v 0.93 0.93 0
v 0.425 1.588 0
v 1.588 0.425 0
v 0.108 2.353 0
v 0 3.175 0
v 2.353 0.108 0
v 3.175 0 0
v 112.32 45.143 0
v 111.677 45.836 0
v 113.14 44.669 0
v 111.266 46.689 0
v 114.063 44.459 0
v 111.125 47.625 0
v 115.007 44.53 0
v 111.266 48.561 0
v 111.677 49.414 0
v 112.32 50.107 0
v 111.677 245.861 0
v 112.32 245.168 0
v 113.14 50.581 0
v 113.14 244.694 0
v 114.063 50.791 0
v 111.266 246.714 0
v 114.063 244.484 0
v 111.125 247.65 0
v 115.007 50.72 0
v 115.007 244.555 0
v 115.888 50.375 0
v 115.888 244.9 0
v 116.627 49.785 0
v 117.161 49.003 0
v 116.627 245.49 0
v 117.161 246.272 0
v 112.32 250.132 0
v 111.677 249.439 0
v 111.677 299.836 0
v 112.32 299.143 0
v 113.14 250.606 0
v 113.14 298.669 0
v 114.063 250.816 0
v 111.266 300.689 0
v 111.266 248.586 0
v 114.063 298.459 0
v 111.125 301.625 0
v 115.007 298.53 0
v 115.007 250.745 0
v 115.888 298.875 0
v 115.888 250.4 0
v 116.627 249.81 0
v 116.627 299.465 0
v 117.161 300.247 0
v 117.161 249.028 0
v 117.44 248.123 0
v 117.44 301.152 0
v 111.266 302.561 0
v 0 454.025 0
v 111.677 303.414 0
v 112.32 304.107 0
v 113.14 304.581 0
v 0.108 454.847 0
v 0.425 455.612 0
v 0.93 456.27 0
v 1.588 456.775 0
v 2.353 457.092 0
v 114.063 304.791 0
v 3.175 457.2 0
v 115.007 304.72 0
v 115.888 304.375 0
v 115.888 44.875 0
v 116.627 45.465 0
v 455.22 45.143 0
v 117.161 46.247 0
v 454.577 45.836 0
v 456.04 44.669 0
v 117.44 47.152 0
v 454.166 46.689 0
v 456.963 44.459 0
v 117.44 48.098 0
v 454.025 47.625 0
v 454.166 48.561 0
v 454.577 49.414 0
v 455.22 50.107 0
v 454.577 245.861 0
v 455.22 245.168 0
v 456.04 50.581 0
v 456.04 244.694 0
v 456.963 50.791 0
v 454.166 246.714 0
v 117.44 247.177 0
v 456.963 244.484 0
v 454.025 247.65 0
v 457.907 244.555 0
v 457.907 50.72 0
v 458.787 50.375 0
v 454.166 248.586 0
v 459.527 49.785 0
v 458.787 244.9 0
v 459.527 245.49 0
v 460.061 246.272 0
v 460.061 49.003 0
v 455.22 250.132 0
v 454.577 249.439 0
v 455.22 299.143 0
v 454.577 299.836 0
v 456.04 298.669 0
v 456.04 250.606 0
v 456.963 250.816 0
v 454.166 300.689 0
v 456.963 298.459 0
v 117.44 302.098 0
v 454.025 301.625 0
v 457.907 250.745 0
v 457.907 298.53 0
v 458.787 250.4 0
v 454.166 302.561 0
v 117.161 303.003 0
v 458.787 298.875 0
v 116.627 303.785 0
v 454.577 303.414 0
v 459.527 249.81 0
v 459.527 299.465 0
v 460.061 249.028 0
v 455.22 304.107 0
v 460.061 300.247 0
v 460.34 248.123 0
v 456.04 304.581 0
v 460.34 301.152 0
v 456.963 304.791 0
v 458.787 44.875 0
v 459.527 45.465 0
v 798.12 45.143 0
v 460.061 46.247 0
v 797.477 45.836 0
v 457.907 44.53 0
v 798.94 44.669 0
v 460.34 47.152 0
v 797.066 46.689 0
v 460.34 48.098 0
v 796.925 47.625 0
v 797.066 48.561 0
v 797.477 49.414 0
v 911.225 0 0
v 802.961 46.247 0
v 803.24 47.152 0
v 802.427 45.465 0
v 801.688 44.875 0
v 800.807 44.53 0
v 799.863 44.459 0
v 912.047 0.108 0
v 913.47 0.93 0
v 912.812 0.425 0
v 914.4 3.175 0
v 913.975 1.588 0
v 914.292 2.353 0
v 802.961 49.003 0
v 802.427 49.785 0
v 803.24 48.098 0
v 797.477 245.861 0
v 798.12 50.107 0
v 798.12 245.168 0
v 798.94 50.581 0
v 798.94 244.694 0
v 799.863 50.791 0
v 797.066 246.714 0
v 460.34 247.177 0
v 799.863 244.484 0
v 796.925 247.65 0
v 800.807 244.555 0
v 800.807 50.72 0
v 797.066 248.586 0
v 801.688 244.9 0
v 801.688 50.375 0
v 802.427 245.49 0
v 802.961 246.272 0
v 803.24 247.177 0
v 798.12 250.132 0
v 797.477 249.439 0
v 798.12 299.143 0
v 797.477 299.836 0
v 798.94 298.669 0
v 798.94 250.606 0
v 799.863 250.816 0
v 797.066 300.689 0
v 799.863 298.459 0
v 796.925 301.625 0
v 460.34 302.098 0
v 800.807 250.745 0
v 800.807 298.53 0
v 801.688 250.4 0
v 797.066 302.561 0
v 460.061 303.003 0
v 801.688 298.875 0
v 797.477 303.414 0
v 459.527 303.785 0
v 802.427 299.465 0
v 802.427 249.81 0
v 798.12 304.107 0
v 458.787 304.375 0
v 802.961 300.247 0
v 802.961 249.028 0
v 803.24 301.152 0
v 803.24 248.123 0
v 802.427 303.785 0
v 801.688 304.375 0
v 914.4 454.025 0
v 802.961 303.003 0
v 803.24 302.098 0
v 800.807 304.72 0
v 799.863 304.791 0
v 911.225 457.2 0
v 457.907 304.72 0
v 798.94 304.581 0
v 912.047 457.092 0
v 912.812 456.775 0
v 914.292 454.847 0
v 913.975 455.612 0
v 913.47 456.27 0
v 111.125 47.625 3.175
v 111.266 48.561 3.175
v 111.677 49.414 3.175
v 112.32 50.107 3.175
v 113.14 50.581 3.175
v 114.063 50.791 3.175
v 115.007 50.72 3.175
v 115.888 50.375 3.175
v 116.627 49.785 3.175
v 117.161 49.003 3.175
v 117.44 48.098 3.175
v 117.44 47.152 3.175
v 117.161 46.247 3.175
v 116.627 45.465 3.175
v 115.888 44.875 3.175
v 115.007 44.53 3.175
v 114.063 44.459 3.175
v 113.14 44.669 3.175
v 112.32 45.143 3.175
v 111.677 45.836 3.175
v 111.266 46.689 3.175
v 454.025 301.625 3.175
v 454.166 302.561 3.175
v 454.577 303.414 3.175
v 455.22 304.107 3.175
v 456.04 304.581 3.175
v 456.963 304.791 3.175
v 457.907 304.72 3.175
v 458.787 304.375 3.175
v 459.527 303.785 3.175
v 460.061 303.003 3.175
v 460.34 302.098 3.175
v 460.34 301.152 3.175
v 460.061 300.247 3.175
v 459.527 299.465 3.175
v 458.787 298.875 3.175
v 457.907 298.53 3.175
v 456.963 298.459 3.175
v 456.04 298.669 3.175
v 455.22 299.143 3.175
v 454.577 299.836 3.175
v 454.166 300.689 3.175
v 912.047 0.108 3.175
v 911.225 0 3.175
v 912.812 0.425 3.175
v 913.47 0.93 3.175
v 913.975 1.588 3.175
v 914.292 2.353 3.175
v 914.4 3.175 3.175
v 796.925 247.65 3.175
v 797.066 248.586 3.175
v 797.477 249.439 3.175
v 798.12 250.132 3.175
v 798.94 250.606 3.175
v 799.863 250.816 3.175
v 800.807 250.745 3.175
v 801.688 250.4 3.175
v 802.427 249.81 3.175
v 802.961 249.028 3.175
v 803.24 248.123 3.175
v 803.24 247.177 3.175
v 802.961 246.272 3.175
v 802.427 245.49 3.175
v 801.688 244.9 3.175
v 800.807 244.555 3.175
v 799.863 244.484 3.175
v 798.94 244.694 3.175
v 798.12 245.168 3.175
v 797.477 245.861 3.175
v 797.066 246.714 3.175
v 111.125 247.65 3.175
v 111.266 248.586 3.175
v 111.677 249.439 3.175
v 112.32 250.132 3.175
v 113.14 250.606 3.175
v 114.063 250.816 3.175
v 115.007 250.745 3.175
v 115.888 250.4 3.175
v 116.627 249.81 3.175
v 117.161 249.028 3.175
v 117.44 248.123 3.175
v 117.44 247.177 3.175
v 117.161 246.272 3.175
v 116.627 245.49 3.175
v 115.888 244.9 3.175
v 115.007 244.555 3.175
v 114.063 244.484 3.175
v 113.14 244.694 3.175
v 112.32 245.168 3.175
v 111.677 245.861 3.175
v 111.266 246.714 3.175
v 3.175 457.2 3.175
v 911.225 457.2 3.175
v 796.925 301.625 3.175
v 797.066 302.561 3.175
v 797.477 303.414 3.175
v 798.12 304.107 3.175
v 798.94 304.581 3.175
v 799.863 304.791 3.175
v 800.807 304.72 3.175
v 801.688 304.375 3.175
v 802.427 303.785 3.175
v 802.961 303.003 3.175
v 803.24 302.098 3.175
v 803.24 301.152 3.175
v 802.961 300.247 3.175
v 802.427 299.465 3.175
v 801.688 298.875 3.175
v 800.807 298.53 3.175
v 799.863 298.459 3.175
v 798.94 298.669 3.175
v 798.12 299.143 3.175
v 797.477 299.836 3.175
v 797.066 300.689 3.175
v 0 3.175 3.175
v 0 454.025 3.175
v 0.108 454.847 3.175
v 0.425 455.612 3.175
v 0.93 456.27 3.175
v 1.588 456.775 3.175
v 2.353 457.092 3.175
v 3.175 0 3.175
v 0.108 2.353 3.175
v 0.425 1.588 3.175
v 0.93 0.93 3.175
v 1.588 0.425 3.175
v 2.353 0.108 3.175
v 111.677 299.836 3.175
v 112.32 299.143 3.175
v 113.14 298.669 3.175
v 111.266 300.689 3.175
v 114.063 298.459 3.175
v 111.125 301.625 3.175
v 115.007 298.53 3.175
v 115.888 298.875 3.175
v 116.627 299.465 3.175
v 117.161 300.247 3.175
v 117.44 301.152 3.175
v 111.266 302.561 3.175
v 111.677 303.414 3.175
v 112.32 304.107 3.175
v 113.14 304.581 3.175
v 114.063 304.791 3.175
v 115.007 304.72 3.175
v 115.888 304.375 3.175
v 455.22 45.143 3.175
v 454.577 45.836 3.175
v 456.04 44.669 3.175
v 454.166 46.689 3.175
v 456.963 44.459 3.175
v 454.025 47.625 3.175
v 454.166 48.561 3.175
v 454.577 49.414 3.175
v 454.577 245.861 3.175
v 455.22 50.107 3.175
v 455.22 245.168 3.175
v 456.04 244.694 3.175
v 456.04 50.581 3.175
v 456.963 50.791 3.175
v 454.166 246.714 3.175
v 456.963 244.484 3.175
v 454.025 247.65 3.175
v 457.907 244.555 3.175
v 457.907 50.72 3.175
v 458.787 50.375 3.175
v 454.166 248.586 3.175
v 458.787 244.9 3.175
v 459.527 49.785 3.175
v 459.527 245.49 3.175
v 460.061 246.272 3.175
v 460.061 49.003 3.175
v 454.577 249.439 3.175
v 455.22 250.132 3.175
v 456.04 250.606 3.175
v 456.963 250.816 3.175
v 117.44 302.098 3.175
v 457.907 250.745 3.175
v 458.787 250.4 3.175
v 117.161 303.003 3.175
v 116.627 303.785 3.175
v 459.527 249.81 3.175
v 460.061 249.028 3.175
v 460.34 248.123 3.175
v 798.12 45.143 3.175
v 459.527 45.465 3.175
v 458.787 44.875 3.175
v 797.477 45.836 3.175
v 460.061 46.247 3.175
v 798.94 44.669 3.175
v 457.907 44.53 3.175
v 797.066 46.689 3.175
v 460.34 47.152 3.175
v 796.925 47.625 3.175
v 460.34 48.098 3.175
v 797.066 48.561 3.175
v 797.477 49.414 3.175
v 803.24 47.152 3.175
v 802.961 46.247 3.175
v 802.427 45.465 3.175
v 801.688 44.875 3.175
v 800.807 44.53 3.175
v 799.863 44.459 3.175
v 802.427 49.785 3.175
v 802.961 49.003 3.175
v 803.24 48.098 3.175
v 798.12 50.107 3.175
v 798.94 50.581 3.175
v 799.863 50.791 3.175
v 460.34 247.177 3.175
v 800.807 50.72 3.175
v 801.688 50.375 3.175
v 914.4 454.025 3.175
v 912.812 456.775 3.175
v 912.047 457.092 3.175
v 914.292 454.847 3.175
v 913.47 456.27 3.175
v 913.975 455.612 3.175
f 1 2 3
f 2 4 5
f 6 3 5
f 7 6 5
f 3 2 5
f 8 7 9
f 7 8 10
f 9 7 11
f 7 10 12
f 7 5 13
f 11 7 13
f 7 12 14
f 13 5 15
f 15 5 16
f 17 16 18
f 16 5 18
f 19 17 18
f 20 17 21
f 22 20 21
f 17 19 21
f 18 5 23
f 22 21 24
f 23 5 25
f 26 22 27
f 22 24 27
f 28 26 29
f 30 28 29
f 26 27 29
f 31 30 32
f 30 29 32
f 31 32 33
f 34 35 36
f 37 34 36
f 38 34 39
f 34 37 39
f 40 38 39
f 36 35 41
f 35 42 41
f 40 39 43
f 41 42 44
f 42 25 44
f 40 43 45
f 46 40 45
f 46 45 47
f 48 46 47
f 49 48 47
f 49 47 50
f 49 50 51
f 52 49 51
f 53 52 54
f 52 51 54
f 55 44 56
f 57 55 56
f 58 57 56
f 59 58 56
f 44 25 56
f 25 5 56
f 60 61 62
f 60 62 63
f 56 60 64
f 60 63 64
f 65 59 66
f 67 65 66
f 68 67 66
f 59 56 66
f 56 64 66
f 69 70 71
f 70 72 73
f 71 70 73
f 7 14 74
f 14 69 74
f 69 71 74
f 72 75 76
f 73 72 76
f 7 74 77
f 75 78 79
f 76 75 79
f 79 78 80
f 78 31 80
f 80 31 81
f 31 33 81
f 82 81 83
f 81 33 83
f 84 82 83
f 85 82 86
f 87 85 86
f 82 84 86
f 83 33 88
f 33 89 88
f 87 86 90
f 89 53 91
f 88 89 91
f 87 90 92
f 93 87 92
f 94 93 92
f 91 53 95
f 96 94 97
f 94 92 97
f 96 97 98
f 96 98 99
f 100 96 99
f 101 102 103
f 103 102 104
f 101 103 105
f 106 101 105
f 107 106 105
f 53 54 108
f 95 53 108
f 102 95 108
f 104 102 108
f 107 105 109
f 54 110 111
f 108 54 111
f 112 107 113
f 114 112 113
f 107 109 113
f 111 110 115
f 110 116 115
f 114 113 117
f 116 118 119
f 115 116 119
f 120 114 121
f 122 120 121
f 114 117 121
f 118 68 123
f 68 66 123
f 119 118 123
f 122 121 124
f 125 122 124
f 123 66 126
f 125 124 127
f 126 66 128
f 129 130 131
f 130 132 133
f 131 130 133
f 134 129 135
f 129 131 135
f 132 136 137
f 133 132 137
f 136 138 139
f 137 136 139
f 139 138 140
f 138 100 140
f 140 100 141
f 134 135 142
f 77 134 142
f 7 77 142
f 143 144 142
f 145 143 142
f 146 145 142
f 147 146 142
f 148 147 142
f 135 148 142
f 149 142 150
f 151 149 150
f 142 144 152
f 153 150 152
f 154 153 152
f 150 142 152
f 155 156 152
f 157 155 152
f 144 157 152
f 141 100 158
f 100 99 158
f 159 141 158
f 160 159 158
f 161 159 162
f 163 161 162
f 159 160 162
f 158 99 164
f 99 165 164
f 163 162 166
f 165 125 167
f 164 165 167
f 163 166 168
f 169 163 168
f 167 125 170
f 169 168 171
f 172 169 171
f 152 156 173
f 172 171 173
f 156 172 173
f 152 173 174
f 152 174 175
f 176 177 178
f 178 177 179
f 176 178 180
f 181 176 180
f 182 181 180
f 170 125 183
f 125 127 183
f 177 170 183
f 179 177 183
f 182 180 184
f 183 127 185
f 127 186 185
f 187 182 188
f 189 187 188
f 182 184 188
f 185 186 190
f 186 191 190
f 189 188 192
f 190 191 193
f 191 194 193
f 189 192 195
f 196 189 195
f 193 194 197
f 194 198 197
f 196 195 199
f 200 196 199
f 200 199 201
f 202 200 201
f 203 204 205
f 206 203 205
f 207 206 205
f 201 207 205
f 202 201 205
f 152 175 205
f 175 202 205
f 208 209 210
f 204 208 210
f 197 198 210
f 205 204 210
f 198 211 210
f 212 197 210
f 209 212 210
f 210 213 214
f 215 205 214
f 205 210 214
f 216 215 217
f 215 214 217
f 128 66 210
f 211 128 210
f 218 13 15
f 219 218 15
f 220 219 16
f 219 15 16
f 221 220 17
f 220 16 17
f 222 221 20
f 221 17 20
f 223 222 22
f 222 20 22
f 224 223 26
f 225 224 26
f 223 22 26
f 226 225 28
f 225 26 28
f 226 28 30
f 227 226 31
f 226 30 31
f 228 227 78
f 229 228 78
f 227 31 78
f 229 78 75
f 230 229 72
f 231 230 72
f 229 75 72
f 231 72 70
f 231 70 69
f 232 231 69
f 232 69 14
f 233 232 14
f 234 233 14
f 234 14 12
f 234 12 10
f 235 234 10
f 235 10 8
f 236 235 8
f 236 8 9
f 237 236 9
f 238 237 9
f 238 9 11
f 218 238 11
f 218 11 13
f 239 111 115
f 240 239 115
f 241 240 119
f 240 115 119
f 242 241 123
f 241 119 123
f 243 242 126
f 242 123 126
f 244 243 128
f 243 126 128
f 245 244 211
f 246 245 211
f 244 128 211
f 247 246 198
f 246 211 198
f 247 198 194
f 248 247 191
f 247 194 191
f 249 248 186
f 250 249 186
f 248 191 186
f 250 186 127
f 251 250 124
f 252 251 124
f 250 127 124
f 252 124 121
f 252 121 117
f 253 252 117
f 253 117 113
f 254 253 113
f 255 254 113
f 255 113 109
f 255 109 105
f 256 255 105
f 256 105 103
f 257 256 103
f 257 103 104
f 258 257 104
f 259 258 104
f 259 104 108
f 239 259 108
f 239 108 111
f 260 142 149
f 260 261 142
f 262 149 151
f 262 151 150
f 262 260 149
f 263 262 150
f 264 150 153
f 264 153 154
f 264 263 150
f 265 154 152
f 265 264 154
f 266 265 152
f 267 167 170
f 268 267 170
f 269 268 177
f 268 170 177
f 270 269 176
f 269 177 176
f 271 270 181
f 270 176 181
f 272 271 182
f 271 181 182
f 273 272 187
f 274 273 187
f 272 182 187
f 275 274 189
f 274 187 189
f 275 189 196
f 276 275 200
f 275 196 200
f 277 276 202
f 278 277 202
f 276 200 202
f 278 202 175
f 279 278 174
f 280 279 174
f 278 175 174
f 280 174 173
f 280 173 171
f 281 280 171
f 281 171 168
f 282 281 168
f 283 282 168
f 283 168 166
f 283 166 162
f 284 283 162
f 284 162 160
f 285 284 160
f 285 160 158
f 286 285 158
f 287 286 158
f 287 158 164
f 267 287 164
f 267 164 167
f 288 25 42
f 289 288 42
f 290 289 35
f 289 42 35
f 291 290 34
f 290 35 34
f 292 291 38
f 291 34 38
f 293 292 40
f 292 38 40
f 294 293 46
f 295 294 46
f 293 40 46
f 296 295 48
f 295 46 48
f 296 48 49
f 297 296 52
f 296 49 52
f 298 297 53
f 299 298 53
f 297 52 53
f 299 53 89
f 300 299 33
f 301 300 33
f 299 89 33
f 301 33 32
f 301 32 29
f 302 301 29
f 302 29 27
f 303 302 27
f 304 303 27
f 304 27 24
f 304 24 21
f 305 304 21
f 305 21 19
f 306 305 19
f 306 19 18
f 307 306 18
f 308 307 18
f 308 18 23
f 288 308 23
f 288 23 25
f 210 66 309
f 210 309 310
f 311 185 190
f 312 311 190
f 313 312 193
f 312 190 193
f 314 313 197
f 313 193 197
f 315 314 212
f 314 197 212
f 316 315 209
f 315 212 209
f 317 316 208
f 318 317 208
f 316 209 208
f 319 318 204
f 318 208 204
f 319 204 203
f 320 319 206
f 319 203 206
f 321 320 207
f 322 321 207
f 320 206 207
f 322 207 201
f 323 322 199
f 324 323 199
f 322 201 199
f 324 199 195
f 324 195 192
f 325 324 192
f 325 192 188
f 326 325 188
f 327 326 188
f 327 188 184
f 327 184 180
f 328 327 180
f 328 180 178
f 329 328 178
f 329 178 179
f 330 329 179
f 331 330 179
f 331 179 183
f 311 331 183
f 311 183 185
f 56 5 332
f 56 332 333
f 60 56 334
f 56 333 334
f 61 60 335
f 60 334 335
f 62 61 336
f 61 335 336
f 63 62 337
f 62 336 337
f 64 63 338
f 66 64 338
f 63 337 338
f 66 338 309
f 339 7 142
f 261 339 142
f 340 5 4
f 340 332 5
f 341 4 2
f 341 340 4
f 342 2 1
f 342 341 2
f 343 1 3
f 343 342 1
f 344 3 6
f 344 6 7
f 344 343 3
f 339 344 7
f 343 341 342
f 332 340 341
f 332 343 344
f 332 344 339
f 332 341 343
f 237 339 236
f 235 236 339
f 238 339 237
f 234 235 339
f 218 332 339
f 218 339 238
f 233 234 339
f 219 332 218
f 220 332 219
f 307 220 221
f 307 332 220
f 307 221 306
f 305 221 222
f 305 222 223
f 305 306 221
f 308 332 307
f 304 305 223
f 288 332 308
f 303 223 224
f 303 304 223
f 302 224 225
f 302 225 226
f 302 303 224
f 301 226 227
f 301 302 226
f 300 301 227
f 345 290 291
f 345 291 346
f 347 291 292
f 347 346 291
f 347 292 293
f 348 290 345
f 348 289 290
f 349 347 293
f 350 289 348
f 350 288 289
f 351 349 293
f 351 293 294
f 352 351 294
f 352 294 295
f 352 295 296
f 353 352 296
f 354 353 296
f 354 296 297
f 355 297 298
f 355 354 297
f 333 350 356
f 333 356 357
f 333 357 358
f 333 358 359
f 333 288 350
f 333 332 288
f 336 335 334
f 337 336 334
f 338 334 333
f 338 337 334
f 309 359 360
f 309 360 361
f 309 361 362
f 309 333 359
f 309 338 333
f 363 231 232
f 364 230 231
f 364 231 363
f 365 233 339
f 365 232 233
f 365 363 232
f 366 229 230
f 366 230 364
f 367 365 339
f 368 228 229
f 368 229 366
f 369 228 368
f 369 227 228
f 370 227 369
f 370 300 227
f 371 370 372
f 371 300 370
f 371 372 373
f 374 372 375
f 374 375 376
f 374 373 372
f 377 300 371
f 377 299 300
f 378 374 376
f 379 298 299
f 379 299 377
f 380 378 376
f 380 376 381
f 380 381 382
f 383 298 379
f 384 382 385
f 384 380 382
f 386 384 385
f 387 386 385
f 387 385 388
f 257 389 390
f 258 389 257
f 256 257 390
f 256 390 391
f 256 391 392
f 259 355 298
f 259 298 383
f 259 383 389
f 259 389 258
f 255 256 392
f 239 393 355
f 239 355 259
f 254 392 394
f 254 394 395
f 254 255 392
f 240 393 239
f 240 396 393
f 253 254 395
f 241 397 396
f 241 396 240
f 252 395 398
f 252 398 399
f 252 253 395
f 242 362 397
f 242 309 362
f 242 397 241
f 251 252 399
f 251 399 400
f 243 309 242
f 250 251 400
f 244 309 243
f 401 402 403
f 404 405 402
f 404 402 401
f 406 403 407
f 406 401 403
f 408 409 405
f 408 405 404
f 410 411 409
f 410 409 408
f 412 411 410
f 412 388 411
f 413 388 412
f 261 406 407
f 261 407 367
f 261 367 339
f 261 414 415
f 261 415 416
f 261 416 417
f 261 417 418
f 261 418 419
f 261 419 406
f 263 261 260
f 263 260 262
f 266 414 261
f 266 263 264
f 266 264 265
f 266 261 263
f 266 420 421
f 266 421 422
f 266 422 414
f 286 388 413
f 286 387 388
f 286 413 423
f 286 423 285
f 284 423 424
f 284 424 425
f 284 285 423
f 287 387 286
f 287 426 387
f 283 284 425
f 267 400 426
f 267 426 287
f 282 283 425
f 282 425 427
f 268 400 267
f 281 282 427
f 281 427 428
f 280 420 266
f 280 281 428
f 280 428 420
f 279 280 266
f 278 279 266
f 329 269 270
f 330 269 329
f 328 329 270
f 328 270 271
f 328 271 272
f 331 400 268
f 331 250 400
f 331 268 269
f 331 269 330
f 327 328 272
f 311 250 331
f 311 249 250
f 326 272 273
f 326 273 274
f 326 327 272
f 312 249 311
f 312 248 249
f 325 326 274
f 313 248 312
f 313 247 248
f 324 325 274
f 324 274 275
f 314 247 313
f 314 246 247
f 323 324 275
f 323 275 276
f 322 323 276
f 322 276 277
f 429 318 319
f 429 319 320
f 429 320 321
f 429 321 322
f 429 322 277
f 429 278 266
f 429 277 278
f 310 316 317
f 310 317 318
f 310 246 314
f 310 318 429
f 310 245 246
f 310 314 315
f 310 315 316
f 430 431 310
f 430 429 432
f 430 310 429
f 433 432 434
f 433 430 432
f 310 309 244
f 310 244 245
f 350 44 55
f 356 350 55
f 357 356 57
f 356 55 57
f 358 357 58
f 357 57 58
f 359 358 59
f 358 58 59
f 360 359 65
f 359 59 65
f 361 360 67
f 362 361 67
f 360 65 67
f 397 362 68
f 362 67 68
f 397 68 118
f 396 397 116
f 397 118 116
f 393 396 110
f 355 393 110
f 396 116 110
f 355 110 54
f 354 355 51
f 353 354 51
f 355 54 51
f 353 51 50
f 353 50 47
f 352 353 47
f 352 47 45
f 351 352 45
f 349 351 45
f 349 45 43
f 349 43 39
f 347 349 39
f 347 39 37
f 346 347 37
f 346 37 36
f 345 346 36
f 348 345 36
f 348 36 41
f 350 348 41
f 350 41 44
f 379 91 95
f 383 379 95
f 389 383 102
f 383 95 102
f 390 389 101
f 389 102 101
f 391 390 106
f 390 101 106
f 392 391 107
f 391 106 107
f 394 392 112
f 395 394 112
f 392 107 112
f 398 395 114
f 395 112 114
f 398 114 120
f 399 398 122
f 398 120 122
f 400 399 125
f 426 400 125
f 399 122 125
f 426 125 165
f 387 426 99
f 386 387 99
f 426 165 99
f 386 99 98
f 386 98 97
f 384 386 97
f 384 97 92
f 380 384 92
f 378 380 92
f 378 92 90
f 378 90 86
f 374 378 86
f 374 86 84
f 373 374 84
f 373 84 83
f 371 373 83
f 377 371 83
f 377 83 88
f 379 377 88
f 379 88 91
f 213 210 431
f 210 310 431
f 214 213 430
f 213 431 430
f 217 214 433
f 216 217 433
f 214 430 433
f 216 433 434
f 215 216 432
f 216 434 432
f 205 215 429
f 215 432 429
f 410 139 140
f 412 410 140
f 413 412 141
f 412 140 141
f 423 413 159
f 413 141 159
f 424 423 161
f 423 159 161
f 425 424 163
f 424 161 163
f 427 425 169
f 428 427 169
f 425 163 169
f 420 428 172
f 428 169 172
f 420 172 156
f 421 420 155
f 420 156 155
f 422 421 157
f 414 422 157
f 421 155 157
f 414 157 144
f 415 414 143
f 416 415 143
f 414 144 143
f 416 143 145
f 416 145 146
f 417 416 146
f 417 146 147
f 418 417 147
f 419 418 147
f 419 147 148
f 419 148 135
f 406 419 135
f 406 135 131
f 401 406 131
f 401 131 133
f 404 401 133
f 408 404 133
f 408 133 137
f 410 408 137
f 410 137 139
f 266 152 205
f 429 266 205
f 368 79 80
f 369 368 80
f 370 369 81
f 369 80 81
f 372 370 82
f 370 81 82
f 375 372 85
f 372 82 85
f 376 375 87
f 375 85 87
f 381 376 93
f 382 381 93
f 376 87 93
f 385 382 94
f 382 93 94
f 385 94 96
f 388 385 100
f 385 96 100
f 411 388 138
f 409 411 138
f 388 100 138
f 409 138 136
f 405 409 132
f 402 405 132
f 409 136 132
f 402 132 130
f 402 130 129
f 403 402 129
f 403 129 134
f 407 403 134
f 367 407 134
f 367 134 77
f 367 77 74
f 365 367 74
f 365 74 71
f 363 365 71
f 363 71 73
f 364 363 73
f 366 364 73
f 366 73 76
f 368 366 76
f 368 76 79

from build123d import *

# Parameters (mm, degrees)
SKETCH1_W                   = 914.4
SKETCH1_H                   = 457.2
BOSS_EXTRUDE1_DEPTH         = 3.175
F_1_4_0_25_DIAMETER_HOLE1_D = 6.35
FILLET1_R                   = 3.175


with BuildPart() as part:
    # Sketch1 → Boss-Extrude1 (new body)
    with BuildSketch(Plane.XY):
        with Locations((457.2, 228.6)):
            Rectangle(SKETCH1_W, SKETCH1_H)
    extrude(amount=BOSS_EXTRUDE1_DEPTH)

    # 1/4 (0.25) Diameter Hole1 (through all)
    with Locations(Plane.XY.offset(3.175)):
        with Locations((114.3, 247.65), (114.3, 301.625), (457.2, 301.625), (457.2, 247.65), (800.1, 247.65), (800.1, 301.625), (114.3, 47.625), (457.2, 47.625), (800.1, 47.625)):
            Hole(F_1_4_0_25_DIAMETER_HOLE1_D / 2)

    # Fillet1
    fillet1_edges = [part.edges().sort_by_distance(p)[0] for p in [
        (0, 457.2, 1.5875),
        (914.4, 457.2, 1.5875),
        (914.4, 0, 1.5875),
        (0, 0, 1.5875),
    ]]
    fillet(fillet1_edges, radius=FILLET1_R)


solid = part.part
